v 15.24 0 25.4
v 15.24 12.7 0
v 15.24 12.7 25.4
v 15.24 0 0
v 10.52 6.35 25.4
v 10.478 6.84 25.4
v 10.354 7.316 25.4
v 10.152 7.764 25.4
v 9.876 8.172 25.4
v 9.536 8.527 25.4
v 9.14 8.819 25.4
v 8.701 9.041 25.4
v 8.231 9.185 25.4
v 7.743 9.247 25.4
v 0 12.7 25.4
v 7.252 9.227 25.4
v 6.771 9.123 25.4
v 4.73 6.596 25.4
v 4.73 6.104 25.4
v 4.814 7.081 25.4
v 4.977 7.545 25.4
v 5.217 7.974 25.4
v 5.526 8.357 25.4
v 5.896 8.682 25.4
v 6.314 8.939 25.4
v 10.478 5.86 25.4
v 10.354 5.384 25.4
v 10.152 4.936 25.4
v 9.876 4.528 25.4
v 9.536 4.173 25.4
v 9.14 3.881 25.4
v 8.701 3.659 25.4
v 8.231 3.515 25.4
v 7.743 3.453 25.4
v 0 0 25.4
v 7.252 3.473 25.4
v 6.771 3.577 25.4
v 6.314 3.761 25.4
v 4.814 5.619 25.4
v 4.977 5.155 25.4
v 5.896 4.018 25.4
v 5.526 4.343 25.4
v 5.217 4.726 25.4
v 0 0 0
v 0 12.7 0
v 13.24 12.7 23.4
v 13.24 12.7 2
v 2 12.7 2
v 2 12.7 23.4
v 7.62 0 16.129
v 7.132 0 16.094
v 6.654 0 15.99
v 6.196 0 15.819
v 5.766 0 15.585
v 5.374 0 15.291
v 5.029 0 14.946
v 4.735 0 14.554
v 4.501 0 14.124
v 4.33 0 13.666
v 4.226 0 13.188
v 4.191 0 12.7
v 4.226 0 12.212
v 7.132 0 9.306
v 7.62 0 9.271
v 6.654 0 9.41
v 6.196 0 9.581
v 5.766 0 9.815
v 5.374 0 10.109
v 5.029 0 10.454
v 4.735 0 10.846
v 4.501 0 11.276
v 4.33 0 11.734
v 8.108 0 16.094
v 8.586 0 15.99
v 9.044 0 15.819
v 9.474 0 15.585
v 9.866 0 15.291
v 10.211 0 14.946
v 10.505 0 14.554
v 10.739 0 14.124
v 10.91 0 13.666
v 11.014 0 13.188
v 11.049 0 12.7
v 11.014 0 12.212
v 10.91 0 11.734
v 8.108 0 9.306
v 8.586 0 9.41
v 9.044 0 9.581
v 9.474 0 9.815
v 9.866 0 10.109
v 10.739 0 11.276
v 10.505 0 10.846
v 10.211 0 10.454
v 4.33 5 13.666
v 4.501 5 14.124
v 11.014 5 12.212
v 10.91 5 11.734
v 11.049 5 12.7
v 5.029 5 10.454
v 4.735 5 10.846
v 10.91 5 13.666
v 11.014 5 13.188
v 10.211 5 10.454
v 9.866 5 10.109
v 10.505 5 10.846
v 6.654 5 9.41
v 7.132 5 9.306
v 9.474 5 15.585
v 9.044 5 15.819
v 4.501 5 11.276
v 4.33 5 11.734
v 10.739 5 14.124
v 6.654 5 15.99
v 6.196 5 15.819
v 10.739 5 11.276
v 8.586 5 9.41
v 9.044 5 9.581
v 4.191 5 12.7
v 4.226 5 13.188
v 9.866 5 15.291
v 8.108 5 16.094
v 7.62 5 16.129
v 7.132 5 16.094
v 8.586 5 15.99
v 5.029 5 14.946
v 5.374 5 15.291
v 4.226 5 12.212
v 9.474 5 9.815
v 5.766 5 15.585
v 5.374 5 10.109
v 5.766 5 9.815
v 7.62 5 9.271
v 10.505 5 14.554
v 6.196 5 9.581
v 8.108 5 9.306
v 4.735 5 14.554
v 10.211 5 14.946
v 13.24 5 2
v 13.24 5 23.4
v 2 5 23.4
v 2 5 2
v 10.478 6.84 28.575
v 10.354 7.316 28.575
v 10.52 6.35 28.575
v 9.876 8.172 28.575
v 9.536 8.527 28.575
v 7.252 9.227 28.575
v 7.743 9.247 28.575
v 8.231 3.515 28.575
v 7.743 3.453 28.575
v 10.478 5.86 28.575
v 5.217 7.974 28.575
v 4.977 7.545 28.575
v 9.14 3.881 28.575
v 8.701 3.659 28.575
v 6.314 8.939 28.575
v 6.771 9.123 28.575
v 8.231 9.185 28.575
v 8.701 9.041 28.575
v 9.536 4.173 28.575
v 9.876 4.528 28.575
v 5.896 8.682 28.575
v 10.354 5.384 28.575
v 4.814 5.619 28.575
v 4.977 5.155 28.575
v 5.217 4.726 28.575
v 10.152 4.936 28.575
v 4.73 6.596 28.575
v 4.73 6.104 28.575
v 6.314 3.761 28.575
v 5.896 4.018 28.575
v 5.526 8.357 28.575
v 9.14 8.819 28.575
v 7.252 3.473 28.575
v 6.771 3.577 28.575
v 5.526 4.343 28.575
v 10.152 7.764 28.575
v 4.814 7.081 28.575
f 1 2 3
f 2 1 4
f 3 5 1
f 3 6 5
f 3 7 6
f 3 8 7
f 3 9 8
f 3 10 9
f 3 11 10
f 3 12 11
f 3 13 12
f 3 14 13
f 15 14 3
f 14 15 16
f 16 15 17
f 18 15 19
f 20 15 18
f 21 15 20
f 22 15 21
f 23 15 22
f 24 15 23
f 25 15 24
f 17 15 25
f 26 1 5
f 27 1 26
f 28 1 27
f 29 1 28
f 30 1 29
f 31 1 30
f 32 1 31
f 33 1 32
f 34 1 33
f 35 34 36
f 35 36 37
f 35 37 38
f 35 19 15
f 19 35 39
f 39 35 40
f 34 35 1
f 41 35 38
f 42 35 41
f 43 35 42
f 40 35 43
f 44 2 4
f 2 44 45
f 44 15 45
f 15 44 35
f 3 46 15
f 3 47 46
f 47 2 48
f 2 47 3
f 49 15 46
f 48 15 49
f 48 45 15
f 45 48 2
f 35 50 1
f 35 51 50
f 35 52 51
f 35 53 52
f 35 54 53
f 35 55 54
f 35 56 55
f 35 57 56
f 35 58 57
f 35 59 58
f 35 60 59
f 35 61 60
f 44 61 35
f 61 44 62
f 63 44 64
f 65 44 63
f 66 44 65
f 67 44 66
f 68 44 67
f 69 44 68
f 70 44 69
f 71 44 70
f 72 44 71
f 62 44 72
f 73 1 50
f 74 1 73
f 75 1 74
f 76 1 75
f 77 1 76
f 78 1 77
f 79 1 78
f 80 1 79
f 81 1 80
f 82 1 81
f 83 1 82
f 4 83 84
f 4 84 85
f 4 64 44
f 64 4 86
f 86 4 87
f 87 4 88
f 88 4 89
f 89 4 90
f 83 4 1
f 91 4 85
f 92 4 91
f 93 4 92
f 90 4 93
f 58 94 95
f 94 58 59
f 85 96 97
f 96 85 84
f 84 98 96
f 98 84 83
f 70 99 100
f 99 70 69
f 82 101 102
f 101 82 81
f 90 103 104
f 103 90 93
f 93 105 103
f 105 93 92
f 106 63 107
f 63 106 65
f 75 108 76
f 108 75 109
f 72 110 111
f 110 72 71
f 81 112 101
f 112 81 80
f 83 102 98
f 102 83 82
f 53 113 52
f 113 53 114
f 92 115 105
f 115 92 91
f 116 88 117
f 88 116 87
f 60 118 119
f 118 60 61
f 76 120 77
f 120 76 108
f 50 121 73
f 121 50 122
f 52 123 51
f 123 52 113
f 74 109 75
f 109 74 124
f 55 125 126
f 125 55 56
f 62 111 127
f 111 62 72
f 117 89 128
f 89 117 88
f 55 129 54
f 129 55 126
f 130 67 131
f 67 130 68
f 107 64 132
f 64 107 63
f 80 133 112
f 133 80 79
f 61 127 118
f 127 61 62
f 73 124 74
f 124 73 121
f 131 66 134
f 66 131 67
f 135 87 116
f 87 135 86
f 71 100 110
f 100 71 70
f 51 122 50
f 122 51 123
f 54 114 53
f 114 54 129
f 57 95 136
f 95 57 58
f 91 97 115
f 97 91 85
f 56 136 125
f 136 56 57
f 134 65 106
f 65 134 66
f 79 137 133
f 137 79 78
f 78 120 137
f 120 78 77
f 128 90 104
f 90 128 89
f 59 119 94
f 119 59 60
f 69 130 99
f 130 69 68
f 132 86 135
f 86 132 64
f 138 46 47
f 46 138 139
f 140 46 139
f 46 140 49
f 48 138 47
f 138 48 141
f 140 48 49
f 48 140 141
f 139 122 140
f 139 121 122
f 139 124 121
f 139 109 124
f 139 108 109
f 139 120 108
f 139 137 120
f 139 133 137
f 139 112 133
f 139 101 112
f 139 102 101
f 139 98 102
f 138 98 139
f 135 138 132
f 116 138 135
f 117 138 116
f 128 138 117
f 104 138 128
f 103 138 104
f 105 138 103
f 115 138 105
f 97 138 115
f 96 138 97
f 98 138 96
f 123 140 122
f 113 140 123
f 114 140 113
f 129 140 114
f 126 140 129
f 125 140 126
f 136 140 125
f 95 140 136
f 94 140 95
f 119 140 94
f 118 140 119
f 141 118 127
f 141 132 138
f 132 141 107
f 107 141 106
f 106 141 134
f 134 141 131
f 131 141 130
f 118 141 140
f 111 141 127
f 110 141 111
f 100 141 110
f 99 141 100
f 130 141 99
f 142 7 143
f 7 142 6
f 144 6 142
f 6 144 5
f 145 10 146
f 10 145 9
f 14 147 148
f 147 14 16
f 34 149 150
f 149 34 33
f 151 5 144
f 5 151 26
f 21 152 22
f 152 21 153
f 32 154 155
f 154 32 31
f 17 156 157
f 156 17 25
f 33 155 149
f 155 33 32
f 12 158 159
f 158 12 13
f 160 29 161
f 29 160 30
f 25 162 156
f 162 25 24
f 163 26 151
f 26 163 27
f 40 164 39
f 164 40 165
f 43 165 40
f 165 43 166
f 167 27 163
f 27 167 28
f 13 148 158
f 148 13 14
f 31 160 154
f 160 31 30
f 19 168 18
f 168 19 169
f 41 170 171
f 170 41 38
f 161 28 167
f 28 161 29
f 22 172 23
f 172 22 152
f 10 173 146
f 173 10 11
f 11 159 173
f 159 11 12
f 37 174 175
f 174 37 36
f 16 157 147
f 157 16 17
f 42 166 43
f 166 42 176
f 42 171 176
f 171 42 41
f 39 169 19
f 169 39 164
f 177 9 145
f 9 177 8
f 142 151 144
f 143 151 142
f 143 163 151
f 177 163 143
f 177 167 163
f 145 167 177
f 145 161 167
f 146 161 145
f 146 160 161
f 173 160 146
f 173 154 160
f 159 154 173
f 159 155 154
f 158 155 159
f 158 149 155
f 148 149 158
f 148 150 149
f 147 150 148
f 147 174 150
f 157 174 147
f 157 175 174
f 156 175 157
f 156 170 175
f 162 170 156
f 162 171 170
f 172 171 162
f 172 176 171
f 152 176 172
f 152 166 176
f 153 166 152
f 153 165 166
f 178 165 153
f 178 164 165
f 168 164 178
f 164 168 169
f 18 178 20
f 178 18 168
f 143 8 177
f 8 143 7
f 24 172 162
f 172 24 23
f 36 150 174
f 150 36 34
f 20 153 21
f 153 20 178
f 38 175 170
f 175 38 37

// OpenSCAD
$fs = 0.5;
$fa = 1;
mm = 1;
inch = 25.4 * mm;

back_thickness = 5 * mm;
bracket_thickness = 2 * mm;
bracket_depth = 0.5 * inch;
bracket_width = 0.6 * inch;
bracket_height = 1 * inch;
pin_dia = 5.8 * mm; // 6mm hole
pin_height = 0.125 * inch;

hole_dia = 0.27 * inch;

module shelf_pin()
{
    difference()
    {
        cube([ bracket_width, bracket_depth, bracket_height ]);
        translate([ bracket_width / 2, -0.1, bracket_height / 2 ]) rotate([ -90, 0, 0 ])
            cylinder(d = hole_dia, h = back_thickness + 0.2);

        translate([
            bracket_thickness,
            back_thickness,
            bracket_thickness,
        ])
            cube([
                bracket_width - 2 * bracket_thickness,
                bracket_depth,
                bracket_height - 2 * bracket_thickness,
            ]);
    }

    translate([ bracket_width / 2, bracket_depth / 2, bracket_height ]) cylinder(d = pin_dia, h = pin_height);
}

shelf_pin();
